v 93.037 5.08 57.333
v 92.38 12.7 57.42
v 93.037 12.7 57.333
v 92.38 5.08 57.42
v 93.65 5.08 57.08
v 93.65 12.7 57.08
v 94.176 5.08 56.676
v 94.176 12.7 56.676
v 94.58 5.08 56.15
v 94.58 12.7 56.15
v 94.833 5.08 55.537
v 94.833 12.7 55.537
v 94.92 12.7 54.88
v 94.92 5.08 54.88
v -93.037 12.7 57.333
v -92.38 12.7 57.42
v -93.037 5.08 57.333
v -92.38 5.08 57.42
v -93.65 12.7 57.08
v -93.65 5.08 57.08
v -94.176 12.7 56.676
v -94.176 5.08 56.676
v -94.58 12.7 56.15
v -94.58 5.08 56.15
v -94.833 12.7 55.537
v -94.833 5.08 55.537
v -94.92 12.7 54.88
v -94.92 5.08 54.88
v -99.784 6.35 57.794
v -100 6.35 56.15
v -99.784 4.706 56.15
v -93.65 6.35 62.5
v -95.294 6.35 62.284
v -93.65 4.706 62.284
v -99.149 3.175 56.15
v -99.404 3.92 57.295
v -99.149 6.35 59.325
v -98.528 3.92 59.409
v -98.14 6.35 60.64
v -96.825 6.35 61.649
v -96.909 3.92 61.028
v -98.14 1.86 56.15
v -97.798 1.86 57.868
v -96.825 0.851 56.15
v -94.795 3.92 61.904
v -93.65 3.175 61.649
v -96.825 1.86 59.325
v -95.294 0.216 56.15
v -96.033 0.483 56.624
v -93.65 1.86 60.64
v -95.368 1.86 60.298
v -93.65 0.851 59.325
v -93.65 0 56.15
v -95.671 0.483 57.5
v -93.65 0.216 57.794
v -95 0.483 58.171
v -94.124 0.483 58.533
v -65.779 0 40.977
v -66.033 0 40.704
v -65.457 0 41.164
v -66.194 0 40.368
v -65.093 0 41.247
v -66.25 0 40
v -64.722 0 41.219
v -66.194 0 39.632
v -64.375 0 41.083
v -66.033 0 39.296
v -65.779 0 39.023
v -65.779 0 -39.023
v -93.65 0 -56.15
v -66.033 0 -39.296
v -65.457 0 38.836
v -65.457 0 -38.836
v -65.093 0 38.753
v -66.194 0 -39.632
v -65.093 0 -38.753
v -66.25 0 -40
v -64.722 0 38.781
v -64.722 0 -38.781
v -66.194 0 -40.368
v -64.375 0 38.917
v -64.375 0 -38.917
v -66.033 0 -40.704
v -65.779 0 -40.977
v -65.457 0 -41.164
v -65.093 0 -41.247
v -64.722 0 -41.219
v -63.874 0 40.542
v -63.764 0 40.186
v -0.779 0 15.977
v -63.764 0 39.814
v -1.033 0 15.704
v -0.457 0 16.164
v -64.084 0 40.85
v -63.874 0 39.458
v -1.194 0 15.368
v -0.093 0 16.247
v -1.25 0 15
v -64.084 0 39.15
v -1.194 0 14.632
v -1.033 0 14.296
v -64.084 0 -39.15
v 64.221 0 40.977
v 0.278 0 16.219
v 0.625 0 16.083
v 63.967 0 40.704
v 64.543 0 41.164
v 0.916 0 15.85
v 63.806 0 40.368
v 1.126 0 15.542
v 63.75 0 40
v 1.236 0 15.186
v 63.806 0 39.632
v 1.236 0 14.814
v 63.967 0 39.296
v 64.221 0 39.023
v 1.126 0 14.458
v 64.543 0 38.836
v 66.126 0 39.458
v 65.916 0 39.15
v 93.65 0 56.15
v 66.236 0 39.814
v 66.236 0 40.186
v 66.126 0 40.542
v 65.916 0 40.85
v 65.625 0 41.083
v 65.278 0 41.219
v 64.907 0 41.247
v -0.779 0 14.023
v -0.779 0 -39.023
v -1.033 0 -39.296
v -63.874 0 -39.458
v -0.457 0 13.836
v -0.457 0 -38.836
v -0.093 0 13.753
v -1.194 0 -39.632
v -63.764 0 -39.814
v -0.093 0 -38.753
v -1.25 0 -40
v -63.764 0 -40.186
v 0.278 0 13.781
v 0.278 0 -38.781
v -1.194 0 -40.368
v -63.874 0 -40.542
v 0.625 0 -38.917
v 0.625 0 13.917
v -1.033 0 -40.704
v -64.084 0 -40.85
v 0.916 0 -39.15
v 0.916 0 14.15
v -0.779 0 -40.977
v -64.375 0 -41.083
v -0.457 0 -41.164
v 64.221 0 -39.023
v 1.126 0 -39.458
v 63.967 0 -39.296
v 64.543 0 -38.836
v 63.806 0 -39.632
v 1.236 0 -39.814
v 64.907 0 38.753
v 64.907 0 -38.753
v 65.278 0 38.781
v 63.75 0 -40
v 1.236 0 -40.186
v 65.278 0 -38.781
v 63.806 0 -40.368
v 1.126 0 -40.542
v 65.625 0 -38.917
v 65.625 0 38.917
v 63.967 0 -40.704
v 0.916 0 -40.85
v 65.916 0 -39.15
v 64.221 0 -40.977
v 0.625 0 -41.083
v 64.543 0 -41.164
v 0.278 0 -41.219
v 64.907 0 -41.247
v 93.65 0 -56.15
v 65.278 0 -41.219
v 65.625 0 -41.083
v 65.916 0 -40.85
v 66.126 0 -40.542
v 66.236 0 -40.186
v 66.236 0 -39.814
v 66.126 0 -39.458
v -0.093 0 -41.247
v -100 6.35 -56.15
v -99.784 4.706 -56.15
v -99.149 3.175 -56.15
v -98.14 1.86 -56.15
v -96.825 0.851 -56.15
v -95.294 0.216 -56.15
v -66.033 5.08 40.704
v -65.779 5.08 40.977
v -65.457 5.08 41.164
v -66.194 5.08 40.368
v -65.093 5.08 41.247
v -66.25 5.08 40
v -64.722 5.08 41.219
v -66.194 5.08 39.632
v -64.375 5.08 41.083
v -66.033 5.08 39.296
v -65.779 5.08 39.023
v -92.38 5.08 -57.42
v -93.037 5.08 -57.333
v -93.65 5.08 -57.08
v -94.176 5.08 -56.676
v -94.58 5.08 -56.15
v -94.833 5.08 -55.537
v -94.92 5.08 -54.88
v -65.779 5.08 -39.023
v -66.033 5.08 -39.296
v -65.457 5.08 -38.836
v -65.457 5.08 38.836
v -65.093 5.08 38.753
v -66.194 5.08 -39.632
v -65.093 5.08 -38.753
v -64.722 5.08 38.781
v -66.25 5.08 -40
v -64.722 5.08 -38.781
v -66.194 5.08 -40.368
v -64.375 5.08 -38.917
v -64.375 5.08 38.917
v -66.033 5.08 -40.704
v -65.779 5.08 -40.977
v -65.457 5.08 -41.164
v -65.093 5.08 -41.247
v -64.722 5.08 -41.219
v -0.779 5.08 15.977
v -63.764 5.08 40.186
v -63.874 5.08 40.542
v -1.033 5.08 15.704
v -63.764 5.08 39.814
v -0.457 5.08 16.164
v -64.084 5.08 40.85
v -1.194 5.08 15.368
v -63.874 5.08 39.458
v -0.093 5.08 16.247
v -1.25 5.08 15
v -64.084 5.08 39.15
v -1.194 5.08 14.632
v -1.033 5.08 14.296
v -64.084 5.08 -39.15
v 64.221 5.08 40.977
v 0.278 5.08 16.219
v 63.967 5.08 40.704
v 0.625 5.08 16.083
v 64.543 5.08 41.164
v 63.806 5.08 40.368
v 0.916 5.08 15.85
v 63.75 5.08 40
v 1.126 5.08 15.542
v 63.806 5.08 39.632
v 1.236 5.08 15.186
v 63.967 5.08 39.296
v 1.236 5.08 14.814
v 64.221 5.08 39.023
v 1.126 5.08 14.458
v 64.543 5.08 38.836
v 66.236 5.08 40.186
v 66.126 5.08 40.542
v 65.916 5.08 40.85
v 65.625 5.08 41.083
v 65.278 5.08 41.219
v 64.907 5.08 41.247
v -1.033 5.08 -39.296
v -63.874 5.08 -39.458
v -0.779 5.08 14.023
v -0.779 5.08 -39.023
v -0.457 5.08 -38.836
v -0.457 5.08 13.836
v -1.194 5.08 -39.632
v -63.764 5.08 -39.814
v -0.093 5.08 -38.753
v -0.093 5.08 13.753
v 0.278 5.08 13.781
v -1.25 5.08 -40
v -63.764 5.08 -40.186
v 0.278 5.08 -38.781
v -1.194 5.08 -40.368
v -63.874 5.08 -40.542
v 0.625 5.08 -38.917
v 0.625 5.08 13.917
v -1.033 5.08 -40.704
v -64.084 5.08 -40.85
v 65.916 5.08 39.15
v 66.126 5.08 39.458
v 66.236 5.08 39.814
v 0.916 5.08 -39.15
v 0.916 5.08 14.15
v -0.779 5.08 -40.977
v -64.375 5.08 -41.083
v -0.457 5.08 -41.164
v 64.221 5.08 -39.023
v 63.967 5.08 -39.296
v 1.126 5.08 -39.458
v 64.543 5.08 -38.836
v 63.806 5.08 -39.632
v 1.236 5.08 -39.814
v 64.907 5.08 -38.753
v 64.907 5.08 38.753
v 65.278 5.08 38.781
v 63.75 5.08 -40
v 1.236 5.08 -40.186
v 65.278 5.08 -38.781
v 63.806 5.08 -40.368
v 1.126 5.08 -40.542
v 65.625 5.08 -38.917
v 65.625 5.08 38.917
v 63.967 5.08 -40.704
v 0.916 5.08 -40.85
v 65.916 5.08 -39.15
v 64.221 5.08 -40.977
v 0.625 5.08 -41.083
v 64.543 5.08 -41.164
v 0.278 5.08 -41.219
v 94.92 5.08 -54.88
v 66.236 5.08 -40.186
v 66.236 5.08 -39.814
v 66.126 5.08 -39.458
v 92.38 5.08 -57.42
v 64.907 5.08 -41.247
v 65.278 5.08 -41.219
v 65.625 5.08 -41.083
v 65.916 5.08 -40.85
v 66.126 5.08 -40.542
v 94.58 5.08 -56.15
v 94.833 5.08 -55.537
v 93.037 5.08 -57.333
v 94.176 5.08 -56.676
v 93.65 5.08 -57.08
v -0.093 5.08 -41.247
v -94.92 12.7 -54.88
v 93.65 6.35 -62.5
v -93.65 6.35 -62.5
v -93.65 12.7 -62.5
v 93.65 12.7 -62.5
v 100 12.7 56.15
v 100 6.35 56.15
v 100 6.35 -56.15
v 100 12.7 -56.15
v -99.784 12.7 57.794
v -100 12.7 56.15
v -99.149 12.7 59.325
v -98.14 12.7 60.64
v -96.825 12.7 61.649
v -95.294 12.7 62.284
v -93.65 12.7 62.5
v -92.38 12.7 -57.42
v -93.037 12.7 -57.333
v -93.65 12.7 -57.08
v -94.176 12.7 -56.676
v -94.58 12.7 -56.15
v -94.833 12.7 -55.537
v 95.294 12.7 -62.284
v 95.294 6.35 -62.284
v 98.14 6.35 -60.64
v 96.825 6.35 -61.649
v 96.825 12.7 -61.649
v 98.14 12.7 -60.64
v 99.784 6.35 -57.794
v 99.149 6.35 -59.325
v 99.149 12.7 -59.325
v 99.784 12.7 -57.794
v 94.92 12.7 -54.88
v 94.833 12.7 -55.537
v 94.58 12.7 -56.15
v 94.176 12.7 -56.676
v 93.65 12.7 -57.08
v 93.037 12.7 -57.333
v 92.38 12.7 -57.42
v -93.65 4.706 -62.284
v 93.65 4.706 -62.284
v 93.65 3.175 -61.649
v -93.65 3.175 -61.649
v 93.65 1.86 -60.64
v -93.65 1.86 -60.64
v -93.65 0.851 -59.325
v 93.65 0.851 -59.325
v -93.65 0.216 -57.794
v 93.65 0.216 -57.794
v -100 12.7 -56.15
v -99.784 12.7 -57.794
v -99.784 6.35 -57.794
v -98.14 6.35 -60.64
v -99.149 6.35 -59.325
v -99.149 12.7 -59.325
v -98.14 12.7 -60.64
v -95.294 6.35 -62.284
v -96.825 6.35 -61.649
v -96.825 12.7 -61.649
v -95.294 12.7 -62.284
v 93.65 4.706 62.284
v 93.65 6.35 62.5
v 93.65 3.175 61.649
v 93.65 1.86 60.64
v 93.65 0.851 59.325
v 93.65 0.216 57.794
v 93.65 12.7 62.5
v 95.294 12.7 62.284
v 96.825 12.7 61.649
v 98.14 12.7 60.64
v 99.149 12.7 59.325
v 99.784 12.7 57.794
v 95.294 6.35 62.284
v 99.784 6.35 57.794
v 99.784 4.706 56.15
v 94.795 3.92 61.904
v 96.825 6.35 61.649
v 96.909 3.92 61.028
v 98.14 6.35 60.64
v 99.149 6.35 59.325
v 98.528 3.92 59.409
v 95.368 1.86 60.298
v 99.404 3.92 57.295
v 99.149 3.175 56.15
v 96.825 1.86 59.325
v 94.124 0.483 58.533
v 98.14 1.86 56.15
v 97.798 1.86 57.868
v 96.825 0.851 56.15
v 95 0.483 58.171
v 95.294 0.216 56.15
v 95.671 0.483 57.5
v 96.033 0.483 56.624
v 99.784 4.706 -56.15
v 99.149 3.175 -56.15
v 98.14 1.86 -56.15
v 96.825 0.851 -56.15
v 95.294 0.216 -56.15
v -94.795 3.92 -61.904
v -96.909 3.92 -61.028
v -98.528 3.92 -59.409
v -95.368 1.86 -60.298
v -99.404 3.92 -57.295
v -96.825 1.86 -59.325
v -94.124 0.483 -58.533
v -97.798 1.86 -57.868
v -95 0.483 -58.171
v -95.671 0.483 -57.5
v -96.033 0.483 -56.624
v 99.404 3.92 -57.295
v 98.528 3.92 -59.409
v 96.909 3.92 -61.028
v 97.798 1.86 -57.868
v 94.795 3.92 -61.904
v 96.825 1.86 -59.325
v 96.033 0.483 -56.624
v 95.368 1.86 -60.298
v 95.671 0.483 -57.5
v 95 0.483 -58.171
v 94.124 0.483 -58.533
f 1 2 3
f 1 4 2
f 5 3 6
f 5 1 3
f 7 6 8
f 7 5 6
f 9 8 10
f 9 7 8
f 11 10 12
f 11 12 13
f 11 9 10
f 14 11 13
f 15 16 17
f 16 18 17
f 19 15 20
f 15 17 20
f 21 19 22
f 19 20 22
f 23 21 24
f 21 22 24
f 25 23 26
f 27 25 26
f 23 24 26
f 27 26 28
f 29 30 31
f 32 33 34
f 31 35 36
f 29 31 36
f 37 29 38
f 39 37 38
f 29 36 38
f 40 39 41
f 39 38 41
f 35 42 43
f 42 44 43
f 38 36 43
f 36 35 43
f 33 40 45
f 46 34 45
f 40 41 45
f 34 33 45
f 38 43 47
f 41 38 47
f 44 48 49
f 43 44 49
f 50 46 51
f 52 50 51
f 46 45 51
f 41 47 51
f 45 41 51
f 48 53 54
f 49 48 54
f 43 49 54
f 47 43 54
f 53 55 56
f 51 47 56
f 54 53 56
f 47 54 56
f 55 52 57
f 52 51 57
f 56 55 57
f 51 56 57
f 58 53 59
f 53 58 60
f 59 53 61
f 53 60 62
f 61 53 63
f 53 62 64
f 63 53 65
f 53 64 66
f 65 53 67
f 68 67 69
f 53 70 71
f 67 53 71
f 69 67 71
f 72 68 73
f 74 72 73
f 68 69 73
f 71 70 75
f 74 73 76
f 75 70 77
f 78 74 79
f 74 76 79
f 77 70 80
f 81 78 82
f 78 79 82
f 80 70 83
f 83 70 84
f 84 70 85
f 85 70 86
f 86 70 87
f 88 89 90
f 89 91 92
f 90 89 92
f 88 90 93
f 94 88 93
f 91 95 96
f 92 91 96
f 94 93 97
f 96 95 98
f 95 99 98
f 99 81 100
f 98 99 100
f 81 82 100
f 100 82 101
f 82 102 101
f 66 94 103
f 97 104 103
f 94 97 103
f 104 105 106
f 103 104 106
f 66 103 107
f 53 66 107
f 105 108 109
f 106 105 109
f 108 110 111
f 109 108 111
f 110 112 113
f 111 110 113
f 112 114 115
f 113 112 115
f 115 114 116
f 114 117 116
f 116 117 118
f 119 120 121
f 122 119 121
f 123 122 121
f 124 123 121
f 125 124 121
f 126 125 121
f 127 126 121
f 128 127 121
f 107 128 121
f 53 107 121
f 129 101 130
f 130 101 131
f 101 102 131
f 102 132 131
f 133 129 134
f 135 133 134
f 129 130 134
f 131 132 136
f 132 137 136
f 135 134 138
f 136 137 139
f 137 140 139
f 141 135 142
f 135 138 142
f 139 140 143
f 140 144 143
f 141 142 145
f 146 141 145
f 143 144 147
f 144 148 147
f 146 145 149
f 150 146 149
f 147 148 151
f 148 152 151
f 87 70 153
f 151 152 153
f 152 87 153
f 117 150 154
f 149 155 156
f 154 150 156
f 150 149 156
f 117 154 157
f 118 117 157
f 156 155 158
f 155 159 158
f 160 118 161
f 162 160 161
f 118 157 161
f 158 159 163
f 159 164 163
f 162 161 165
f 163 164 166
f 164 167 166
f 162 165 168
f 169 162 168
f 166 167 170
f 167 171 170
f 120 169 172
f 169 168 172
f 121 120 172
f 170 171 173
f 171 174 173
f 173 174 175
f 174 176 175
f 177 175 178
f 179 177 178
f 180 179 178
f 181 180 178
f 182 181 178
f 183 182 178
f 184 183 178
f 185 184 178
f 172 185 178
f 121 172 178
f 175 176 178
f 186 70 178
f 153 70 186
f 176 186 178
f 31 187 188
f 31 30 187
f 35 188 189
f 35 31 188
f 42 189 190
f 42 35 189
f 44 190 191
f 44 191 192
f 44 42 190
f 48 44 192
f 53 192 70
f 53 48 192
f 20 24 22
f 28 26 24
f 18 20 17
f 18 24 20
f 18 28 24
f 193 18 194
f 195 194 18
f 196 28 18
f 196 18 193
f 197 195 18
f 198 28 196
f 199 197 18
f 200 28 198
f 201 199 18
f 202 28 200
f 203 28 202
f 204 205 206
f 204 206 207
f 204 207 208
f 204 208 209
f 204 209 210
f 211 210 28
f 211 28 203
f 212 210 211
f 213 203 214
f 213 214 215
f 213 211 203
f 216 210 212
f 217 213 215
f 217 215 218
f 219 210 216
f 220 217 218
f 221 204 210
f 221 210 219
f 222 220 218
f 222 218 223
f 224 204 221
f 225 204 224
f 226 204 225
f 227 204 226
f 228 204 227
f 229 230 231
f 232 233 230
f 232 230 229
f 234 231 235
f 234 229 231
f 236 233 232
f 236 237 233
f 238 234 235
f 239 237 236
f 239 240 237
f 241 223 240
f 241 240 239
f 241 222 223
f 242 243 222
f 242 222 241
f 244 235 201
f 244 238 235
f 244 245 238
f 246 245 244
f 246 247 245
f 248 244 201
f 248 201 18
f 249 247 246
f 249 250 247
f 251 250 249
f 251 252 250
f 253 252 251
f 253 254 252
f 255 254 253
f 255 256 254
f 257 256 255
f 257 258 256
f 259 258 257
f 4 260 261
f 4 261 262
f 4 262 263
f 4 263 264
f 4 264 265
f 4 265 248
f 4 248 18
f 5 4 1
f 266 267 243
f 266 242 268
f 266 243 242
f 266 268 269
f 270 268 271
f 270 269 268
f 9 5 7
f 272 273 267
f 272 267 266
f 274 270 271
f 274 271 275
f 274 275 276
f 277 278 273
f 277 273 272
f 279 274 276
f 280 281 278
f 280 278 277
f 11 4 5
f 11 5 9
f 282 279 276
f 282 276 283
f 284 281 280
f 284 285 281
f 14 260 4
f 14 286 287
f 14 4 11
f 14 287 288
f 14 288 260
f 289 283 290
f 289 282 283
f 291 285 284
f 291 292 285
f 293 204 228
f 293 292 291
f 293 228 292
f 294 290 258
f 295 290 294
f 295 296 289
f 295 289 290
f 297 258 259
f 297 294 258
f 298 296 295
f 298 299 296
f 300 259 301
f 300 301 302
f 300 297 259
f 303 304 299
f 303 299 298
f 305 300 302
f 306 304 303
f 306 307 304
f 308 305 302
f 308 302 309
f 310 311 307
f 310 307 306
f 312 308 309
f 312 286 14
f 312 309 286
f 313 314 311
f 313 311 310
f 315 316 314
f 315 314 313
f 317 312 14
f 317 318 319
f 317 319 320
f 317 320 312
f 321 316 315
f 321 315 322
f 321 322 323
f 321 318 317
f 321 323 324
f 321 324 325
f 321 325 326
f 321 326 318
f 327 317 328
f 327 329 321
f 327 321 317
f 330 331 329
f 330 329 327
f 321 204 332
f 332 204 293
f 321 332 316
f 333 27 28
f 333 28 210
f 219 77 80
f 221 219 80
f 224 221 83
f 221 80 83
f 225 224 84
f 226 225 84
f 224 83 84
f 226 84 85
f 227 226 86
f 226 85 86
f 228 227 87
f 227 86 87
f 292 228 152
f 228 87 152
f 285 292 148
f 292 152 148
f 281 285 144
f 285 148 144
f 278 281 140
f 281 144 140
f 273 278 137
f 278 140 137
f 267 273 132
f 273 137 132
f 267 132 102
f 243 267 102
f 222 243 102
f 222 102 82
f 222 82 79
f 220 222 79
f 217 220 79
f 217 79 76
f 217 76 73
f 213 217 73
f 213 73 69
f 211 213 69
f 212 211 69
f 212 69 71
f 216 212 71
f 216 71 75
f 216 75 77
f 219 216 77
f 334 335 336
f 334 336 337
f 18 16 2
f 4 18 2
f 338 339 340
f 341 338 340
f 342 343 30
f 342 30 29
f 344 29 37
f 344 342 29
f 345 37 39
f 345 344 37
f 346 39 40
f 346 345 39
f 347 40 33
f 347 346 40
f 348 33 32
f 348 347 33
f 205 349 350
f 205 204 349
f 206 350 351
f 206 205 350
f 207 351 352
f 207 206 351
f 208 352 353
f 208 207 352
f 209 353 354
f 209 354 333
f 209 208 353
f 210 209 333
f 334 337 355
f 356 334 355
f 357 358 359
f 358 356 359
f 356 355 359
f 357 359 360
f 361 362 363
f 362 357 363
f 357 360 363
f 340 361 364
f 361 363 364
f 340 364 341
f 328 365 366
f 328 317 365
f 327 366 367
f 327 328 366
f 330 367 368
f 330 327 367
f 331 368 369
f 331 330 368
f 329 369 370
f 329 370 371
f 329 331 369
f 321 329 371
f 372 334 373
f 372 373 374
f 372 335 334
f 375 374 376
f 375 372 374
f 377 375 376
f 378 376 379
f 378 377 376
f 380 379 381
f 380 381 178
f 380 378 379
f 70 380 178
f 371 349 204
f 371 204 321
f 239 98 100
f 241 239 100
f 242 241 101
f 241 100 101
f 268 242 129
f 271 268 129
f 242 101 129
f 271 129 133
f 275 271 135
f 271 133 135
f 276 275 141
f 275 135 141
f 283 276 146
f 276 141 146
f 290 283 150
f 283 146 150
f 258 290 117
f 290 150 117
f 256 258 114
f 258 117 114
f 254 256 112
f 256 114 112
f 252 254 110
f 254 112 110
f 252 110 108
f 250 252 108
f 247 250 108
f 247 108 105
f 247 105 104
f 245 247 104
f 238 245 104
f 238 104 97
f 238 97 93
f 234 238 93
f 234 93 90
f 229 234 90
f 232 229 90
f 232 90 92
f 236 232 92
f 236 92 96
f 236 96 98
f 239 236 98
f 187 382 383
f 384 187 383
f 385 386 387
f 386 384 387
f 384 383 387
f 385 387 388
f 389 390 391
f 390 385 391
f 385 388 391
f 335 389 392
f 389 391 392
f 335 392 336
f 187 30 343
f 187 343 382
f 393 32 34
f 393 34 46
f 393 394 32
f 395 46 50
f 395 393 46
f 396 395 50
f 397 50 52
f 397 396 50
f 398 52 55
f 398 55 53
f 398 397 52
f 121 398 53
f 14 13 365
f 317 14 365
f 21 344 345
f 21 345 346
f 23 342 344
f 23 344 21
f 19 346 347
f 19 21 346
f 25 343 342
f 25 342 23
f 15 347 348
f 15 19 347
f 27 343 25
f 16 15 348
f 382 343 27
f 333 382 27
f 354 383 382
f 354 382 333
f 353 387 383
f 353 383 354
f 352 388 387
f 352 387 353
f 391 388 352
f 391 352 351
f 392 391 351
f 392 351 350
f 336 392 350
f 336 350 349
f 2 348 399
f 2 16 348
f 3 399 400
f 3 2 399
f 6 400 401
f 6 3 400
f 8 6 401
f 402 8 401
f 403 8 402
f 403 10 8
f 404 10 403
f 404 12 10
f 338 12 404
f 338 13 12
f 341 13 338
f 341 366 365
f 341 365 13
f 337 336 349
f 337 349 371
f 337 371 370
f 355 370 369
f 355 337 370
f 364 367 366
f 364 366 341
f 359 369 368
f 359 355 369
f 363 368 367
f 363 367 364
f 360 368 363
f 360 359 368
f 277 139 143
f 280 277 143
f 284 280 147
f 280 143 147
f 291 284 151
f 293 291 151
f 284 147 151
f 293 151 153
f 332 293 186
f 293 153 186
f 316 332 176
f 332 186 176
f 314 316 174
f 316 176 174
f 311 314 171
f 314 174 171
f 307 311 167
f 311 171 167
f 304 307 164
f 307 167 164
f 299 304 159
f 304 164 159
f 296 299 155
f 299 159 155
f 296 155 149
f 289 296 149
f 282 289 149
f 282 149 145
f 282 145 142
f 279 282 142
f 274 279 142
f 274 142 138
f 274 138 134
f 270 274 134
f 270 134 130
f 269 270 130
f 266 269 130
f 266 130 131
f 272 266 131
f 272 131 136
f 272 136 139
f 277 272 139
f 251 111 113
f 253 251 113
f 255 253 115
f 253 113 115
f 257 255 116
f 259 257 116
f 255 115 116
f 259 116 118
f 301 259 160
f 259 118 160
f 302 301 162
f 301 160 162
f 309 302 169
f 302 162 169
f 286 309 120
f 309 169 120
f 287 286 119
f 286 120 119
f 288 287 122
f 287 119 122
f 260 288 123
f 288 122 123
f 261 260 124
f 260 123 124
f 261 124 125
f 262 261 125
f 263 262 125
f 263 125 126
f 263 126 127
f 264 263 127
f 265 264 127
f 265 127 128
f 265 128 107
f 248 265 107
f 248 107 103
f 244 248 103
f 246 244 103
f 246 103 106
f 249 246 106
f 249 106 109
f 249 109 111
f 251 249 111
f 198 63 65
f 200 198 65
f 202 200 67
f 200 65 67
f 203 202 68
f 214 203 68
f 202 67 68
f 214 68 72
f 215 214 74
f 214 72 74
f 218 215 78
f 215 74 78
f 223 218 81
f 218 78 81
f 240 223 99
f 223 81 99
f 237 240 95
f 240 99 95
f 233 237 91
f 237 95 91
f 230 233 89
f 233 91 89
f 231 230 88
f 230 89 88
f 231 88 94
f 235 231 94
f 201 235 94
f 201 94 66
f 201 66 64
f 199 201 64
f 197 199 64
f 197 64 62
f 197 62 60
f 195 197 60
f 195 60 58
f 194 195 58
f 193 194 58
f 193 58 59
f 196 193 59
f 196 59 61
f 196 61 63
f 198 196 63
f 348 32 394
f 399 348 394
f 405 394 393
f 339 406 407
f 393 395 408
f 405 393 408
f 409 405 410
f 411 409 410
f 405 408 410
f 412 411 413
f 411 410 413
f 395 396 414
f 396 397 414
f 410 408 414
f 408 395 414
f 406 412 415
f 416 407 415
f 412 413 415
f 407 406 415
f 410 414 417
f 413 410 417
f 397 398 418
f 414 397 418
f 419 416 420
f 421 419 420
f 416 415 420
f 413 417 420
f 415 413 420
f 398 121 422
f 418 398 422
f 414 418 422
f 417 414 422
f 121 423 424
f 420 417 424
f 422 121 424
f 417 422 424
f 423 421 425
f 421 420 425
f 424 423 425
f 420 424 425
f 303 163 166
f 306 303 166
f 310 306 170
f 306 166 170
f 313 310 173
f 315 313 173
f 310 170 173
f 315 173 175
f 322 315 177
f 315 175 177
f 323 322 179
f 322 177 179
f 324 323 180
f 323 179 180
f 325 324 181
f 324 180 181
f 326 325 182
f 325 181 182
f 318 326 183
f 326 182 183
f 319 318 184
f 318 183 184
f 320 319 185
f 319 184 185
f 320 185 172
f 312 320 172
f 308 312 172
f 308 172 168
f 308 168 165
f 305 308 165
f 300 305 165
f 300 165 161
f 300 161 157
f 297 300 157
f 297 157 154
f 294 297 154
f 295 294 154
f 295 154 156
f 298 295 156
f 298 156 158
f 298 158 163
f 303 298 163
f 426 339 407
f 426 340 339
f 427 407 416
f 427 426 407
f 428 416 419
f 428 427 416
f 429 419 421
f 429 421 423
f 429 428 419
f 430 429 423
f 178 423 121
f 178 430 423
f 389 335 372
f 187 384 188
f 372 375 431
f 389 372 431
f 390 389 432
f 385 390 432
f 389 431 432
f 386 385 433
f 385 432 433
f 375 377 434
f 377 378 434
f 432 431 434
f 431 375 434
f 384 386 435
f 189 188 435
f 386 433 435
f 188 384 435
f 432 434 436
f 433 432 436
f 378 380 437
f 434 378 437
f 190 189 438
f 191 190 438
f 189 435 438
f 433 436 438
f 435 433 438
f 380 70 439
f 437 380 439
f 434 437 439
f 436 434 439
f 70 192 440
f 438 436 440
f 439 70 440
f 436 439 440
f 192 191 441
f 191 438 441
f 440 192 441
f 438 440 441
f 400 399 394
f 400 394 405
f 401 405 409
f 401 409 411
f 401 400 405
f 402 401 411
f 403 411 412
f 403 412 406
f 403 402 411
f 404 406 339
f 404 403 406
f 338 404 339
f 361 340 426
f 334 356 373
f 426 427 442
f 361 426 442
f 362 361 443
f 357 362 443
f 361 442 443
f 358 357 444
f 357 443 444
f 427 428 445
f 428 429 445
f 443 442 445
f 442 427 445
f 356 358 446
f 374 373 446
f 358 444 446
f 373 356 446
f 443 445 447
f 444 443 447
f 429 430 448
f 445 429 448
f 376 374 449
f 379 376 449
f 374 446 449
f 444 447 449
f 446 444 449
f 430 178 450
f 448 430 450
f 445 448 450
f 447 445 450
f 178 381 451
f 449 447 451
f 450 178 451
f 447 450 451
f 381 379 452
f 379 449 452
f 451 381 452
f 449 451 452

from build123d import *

# Parameters (mm, degrees)
SKETCH1_W             = 200
SKETCH1_H             = 125
BOSS_EXTRUDE1_DEPTH   = 12.7
SKETCH2_W             = 189.84
SKETCH2_H             = 114.84
CUT_EXTRUDE1_DEPTH    = 7.62
FILLET1_R             = 2.54
FILLET2_R             = 6.35
FILLET3_R             = 6.35
M3X0_5_TAPPED_HOLE1_D = 2.5


with BuildPart() as part:
    # Sketch1 → Boss-Extrude1 (new body)
    with BuildSketch(Plane(origin=(0, 0, 0), x_dir=(1, 0, 0), z_dir=(0, 1, 0))):
        Rectangle(SKETCH1_W, SKETCH1_H)
    extrude(amount=BOSS_EXTRUDE1_DEPTH)

    # Sketch2 → Cut-Extrude1 (cut)
    with BuildSketch(Plane(origin=(0, 12.7, 0), x_dir=(1, 0, 0), z_dir=(0, 1, 0))):
        Rectangle(SKETCH2_W, SKETCH2_H)
    extrude(amount=-CUT_EXTRUDE1_DEPTH, mode=Mode.SUBTRACT)

    # Fillet1
    fillet1_edges = [part.edges().sort_by_distance(p)[0] for p in [
        (94.92, 8.89, -57.42),
        (94.92, 8.89, 57.42),
        (-94.92, 8.89, 57.42),
        (-94.92, 8.89, -57.42),
    ]]
    fillet(fillet1_edges, radius=FILLET1_R)

    # Fillet2
    fillet2_edges = [part.edges().sort_by_distance(p)[0] for p in [
        (-100, 6.35, -62.5),
        (100, 6.35, -62.5),
        (100, 6.35, 62.5),
        (-100, 6.35, 62.5),
    ]]
    fillet(fillet2_edges, radius=FILLET2_R)

    # Fillet3
    fillet3_edges = [part.edges().sort_by_distance(p)[0] for p in [
        (0, 0, 62.5),
        (-100, 0, 0),
        (0, 0, -62.5),
        (100, 0, 0),
        (98.140128061, 0, 60.640128061),
        (98.140128061, 0, -60.640128061),
        (-98.140128061, 0, -60.640128061),
        (-98.140128061, 0, 60.640128061),
    ]]
    fillet(fillet3_edges, radius=FILLET3_R)

    # M3x0.5 Tapped Hole1 (through all)
    with Locations(Plane(origin=(0, 5.08, 0), x_dir=(1, 0, 0), z_dir=(0, 1, 0))):
        with Locations((0, -15), (-65, 40), (65, 40), (65, -40), (-65, -40), (0, 40)):
            Hole(M3X0_5_TAPPED_HOLE1_D / 2)


solid = part.part
